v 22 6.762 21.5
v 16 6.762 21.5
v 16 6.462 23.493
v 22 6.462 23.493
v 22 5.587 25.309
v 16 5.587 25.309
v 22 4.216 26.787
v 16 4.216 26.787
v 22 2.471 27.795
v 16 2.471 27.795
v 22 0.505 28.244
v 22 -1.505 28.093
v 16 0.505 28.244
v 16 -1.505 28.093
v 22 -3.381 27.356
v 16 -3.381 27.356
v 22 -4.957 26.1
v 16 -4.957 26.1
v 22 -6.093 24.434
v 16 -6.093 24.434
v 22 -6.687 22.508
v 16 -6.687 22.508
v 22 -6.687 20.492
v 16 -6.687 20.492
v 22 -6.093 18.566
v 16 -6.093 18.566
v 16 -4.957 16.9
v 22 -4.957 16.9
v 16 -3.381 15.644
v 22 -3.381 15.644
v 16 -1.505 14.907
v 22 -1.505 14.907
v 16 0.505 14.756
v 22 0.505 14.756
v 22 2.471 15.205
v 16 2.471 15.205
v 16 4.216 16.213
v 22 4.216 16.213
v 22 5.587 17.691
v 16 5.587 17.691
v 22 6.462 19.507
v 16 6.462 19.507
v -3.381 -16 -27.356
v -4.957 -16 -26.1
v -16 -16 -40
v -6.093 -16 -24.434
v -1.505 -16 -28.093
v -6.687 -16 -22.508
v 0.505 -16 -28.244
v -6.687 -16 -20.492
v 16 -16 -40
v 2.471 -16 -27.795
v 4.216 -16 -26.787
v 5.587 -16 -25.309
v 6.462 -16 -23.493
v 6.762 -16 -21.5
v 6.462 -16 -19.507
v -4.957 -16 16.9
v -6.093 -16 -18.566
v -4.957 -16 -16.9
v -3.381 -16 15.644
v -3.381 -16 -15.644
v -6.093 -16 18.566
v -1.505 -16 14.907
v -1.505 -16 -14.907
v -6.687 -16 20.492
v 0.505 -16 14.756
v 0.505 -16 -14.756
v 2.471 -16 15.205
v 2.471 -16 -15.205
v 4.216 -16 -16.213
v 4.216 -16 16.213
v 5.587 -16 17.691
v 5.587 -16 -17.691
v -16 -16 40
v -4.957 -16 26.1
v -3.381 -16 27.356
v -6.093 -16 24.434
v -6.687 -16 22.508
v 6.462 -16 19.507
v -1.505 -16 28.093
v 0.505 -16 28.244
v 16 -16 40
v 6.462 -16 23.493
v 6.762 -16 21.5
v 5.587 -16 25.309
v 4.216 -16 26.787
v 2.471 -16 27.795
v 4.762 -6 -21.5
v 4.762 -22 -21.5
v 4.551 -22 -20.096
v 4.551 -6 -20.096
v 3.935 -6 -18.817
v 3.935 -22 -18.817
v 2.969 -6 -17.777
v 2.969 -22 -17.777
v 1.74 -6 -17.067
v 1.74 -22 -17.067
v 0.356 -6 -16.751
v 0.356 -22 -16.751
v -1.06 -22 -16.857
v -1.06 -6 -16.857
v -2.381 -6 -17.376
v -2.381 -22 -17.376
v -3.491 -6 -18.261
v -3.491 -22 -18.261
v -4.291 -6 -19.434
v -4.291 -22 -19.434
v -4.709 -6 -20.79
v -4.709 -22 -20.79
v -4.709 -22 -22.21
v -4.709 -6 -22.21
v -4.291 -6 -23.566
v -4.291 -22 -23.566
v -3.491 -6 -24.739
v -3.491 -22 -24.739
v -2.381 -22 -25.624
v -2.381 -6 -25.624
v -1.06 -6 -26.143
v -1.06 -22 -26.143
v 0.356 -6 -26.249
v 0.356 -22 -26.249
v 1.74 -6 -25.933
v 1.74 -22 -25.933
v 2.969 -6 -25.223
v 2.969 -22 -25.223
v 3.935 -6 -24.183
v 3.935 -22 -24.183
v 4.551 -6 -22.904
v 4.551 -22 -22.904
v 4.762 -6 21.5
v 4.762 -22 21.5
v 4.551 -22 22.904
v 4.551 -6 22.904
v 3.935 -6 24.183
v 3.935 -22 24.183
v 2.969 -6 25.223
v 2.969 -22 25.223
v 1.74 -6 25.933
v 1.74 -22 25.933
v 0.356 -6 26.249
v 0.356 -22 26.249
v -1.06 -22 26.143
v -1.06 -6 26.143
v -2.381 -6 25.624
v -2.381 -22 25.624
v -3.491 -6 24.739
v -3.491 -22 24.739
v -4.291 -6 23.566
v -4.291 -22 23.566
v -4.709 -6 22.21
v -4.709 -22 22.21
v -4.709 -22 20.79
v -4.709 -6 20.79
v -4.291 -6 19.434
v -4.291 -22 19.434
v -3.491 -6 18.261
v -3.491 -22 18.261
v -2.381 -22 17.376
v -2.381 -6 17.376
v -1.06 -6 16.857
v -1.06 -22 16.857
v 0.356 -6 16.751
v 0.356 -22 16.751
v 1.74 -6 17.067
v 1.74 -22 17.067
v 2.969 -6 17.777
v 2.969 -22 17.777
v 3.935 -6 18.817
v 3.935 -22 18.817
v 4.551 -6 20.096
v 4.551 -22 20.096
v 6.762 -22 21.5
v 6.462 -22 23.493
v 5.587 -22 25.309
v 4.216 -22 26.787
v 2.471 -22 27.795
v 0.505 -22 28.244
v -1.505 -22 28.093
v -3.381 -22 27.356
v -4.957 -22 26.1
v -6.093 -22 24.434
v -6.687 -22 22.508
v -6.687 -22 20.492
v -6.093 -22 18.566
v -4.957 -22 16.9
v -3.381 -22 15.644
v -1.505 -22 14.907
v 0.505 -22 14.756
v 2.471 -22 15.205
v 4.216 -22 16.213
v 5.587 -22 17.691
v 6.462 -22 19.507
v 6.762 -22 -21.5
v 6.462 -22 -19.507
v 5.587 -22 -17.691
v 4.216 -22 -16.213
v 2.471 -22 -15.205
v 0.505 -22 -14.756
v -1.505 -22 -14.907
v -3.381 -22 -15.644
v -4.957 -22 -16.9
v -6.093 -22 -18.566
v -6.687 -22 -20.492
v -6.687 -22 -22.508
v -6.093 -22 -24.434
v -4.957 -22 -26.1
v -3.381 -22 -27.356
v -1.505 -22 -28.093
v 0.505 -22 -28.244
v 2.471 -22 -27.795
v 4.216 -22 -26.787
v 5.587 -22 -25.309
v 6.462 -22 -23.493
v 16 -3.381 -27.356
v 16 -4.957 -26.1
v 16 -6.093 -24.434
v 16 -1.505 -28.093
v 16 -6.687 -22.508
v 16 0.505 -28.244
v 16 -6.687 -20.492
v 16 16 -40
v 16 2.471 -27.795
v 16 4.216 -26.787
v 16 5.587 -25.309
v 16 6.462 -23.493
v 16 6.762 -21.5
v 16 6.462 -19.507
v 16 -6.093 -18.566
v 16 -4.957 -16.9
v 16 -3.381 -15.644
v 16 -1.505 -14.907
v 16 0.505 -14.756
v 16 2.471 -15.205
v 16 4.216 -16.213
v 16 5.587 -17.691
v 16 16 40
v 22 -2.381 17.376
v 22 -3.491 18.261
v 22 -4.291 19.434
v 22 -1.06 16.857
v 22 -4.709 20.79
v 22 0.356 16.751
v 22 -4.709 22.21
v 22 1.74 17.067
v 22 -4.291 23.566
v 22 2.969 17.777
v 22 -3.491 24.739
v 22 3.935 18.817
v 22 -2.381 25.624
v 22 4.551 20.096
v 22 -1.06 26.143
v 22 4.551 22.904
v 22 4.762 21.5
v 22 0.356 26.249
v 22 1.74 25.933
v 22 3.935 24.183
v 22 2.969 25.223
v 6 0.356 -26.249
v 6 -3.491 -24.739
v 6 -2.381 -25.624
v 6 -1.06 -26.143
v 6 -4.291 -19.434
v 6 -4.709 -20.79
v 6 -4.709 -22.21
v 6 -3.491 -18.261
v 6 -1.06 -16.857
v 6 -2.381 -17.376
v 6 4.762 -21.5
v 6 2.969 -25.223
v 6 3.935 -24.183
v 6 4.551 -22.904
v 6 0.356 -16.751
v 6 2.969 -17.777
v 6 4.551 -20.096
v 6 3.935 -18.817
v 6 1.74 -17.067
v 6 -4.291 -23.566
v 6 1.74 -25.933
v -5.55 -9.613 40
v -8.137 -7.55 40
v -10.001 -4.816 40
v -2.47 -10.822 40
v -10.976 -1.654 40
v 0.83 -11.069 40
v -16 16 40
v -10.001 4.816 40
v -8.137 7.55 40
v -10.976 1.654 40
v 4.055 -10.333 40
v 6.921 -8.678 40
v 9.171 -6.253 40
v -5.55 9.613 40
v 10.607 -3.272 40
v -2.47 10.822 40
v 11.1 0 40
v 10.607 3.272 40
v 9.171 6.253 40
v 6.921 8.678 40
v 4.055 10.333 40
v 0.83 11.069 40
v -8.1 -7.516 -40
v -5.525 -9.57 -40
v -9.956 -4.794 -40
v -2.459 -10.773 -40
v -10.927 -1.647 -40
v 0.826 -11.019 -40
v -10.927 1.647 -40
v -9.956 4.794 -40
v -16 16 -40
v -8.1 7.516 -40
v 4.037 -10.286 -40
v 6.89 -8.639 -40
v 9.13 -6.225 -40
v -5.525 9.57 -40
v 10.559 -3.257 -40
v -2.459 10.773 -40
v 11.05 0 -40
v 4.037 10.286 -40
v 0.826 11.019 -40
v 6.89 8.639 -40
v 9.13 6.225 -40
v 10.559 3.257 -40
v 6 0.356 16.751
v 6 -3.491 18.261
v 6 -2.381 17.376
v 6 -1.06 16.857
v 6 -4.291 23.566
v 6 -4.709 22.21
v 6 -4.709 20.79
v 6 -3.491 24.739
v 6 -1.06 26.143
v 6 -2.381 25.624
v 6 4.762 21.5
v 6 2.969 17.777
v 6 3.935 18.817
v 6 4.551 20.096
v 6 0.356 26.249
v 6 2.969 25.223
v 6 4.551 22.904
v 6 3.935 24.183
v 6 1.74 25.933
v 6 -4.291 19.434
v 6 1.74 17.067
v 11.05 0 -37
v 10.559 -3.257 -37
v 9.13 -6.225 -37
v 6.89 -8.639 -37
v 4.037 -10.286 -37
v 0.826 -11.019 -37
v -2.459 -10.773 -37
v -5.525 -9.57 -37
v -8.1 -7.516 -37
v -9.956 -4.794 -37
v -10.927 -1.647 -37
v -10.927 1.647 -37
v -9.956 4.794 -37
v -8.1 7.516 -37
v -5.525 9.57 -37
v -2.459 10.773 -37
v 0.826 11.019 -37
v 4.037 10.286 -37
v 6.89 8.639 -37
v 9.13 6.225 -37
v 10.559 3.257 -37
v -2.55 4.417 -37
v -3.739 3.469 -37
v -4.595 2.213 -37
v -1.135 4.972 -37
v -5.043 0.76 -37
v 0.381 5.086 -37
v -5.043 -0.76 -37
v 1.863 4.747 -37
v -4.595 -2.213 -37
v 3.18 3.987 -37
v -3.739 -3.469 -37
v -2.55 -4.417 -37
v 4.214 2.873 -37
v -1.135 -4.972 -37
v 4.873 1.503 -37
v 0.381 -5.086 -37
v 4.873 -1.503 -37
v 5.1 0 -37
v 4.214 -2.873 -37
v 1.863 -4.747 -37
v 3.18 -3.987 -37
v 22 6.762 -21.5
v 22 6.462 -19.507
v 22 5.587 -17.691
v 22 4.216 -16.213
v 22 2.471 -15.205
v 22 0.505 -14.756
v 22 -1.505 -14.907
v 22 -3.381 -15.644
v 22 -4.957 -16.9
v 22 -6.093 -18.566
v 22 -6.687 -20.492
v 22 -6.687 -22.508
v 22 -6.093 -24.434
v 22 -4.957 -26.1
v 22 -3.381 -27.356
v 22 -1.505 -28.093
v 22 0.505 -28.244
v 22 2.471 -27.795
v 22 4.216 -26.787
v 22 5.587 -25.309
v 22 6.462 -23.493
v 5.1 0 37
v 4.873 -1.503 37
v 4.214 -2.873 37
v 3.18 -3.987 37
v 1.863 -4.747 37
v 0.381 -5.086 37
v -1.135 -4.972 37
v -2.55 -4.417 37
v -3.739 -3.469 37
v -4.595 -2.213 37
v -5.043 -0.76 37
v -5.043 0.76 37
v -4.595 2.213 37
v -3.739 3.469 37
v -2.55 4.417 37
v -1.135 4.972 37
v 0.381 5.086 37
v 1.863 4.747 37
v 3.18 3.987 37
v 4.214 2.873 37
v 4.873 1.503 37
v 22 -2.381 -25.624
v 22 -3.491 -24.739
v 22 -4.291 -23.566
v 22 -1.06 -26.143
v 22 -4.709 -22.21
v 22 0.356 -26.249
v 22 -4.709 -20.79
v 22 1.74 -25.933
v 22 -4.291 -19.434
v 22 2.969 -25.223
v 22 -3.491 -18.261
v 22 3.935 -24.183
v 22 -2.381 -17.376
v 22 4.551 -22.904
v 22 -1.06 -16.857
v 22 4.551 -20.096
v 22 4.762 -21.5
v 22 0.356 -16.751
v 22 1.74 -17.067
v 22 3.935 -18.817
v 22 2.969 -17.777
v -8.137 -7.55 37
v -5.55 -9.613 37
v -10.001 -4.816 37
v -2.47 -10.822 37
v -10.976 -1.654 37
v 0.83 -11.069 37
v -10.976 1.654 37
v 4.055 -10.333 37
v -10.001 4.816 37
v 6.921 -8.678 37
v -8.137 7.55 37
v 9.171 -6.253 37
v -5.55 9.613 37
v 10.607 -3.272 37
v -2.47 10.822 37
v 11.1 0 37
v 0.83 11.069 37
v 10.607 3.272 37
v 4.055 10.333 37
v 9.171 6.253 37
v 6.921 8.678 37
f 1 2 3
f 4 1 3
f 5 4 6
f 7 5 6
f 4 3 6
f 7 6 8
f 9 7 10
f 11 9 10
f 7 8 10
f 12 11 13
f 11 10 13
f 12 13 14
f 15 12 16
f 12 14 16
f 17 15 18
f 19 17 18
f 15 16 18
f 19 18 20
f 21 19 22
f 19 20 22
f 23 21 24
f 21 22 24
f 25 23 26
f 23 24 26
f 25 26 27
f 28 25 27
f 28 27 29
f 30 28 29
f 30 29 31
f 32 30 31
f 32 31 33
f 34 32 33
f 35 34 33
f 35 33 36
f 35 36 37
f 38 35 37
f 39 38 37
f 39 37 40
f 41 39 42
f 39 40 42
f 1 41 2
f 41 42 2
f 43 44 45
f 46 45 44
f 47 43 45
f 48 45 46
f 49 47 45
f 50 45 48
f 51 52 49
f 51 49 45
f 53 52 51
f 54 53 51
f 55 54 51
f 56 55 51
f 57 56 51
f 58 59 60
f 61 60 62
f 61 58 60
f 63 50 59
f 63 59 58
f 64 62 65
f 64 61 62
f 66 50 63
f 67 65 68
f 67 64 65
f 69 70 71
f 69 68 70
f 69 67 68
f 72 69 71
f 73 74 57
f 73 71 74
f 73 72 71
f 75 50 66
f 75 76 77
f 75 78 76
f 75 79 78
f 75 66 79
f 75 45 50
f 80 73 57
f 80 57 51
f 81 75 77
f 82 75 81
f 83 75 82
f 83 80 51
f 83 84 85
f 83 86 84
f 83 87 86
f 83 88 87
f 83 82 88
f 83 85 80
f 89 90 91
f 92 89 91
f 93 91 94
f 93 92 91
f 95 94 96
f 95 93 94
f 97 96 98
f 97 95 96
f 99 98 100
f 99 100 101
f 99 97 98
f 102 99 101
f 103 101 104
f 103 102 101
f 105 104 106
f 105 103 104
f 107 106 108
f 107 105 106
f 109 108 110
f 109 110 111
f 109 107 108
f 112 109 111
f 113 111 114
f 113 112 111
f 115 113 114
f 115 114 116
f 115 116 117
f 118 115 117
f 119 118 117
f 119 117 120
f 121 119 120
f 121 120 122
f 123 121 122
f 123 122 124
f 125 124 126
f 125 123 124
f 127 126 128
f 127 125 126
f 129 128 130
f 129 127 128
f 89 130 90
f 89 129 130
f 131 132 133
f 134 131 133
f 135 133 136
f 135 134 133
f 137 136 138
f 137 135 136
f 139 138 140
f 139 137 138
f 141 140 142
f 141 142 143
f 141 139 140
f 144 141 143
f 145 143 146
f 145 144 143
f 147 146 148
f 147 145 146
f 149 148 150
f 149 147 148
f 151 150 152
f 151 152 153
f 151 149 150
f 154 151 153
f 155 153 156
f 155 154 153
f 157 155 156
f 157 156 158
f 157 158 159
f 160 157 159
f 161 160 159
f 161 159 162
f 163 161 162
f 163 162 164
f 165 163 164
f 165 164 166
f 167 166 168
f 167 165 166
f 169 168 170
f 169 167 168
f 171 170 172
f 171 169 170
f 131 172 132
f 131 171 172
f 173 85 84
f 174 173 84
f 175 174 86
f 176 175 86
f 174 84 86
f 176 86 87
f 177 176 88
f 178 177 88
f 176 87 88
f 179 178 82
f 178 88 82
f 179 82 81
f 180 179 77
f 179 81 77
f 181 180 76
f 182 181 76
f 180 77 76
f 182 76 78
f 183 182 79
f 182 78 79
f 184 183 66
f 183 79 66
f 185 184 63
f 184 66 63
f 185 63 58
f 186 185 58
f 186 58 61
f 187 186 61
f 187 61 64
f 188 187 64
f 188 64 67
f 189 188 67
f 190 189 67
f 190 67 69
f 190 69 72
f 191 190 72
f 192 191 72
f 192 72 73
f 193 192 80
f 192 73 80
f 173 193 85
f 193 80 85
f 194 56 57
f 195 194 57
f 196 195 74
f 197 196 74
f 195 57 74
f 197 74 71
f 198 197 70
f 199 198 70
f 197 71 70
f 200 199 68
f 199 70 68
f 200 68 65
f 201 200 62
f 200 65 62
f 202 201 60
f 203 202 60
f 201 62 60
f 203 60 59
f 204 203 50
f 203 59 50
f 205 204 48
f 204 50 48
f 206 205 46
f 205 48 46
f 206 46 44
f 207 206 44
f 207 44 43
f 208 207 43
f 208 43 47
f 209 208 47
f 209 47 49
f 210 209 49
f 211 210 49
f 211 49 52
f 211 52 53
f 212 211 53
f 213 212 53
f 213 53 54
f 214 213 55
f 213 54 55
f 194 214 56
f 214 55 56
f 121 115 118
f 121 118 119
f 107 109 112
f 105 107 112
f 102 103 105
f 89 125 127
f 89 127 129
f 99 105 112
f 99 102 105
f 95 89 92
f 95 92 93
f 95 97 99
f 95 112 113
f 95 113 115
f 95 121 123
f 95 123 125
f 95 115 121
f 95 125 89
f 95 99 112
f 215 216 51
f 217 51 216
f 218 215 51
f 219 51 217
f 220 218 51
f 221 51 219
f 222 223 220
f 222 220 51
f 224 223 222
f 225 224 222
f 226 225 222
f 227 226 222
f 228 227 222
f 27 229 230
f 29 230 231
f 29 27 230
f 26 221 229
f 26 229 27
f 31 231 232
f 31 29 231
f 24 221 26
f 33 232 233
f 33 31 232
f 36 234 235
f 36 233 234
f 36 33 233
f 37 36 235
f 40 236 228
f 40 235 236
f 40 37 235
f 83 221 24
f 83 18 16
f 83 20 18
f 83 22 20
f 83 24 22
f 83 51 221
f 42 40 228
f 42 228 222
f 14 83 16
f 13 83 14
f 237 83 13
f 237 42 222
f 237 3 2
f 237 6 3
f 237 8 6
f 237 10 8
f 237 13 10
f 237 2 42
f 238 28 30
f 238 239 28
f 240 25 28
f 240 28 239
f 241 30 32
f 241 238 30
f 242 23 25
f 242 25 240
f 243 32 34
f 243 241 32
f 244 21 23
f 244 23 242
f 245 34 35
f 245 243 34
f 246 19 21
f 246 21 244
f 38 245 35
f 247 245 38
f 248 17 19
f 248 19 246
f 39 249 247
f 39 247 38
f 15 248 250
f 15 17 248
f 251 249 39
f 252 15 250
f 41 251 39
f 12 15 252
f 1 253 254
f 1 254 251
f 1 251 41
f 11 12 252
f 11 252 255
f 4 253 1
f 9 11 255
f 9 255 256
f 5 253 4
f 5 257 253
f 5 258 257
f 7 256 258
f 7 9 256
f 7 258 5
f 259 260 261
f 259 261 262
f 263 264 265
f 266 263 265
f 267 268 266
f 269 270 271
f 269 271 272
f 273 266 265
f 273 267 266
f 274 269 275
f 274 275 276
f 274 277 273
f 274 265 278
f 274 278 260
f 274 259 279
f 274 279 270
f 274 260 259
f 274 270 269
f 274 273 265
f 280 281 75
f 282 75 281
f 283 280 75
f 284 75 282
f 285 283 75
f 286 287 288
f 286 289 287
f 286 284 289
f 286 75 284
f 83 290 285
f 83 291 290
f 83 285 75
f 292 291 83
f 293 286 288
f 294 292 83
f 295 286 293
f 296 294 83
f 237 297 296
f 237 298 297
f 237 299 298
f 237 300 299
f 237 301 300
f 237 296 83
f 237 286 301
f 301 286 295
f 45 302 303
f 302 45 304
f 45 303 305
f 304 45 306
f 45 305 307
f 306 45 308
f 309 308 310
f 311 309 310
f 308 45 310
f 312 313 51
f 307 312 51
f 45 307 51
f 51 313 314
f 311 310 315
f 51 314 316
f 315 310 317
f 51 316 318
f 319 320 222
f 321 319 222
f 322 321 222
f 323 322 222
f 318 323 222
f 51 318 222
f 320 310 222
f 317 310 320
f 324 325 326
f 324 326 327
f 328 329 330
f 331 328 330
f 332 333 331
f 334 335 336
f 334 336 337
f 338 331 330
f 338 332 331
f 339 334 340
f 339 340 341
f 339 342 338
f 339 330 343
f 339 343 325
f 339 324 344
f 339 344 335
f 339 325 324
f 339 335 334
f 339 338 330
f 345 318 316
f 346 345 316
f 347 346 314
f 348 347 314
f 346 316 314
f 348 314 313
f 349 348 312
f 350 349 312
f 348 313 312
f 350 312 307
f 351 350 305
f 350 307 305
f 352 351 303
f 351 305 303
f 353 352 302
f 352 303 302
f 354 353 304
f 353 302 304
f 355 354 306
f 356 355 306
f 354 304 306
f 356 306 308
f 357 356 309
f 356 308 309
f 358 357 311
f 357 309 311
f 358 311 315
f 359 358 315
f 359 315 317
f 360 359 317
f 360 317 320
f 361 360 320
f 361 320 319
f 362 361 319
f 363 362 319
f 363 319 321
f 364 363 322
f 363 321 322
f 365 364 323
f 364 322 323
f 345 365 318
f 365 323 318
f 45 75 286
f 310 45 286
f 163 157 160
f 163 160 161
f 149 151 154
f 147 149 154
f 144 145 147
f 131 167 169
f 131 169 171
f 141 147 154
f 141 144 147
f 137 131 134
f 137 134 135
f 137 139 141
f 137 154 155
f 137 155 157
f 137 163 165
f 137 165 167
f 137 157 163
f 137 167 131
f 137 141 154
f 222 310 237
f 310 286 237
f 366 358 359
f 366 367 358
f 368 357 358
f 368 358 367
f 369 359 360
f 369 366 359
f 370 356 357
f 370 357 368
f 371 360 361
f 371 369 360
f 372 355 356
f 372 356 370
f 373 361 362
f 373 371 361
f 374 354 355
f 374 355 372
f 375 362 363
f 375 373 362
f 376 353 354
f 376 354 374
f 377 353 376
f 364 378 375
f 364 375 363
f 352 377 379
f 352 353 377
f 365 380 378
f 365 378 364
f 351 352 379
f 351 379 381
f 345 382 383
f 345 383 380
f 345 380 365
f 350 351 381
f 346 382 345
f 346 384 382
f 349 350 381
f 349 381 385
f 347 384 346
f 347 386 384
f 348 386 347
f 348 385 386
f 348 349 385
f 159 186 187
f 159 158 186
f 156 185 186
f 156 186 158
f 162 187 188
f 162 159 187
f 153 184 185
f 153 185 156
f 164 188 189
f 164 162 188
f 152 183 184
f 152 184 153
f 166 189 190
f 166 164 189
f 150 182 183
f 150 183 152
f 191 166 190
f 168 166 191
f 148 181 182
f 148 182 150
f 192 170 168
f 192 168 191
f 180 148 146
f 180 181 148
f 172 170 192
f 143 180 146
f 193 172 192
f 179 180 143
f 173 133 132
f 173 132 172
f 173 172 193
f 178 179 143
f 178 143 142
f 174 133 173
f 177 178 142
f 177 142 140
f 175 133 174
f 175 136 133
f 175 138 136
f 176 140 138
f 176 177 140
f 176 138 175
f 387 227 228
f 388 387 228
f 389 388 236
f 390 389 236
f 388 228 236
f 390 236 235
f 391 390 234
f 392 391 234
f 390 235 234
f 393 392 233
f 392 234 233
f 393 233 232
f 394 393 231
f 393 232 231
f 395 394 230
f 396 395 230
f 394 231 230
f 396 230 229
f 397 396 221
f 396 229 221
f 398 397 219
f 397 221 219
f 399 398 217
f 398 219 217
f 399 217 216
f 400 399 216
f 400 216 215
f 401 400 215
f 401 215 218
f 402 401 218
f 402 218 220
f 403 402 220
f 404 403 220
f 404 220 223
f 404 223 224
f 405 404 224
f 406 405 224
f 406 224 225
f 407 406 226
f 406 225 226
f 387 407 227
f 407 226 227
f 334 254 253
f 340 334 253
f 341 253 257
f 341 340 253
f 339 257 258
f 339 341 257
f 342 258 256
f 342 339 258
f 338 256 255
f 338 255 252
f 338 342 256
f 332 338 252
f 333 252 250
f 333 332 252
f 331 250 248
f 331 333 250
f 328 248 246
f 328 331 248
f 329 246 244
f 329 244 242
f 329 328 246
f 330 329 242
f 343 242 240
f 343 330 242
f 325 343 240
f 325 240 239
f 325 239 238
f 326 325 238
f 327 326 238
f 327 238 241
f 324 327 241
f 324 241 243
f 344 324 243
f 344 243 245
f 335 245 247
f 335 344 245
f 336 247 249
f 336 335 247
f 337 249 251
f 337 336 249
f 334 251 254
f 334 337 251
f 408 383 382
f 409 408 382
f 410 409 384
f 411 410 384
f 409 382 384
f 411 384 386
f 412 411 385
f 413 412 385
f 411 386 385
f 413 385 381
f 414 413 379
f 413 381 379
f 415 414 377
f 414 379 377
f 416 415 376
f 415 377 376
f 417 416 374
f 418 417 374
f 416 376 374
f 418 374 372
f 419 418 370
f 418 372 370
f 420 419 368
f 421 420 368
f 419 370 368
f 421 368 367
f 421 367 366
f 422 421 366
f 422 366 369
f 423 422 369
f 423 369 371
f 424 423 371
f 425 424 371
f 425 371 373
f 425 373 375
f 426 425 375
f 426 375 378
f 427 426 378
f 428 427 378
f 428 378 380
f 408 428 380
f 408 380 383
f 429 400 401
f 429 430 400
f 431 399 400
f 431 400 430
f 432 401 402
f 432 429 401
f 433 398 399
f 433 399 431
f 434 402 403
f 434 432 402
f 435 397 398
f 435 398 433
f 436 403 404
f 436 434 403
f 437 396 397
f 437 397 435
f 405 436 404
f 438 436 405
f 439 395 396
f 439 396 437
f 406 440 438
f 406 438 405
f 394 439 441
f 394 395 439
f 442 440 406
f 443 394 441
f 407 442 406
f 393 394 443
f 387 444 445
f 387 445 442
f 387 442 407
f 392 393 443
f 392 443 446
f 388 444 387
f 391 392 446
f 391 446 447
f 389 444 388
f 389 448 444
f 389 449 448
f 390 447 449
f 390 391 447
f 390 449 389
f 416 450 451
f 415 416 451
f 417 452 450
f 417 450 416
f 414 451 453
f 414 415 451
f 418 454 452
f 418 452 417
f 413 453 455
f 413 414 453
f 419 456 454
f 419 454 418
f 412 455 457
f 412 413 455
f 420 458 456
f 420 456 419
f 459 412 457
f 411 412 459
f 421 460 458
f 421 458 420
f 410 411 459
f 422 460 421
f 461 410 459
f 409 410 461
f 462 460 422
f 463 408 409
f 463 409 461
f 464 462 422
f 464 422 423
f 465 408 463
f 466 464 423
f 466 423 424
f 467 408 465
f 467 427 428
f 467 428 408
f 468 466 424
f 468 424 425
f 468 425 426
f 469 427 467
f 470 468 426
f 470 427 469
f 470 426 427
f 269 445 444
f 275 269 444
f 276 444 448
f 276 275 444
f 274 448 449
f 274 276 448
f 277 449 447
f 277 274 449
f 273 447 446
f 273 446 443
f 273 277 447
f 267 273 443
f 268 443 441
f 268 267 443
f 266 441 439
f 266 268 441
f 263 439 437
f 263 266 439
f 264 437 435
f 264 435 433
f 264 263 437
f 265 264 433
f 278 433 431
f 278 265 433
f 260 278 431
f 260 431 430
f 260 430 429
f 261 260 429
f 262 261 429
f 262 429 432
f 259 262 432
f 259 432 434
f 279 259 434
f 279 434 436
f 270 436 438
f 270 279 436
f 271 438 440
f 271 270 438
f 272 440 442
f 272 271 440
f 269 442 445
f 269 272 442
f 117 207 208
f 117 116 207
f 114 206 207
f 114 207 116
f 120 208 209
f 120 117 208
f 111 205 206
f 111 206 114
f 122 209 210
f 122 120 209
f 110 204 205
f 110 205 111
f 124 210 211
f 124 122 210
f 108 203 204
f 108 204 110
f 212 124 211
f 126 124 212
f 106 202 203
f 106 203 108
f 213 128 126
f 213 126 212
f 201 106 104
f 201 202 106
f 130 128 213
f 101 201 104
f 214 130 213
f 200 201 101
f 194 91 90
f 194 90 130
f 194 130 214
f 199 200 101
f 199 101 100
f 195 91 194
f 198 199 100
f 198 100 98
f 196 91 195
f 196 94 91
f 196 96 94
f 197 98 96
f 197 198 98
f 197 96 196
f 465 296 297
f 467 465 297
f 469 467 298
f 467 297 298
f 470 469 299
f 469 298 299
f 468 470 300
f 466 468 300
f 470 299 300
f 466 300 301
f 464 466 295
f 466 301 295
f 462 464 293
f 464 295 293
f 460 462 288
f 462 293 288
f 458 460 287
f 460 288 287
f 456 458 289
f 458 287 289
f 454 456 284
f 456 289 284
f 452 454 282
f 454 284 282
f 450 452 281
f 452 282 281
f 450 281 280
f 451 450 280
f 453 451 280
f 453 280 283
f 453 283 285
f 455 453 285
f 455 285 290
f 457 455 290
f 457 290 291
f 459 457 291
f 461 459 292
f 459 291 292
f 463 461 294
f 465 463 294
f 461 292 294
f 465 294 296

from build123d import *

# Parameters (mm, degrees)
F0_W      = 32
F0_H      = 32
F1_DEPTH  = 40
F2_R      = 4.7625
F3_DEPTH  = 10
F4_R      = 4.7625
F5_DEPTH  = 10
F6_R      = 11.1
F7_DEPTH  = 3
F8_R      = 11.05
F9_DEPTH  = 3
F10_R     = 5.1
F11_DEPTH = 80.001
F12_R     = 6.7625
F12_R_2   = 4.7625
F13_DEPTH = 6
F14_R     = 6.7625
F14_R_2   = 4.7625
F15_DEPTH = 6


with BuildPart() as f1:
    # F0 (on Top) → F1 (new body, symmetric)
    with BuildSketch(Plane.XY):
        Rectangle(F0_W, F0_H)
    extrude(amount=F1_DEPTH, both=True)

    # F2 (on face) → F3 (cut)
    with BuildSketch(Plane.YZ.offset(16)):
        with Locations((0, 21.5)):
            Circle(F2_R)
        with Locations((0, -21.5)):
            Circle(F2_R)
    extrude(amount=-F3_DEPTH, mode=Mode.SUBTRACT)

    # F4 (on face) → F5 (cut)
    with BuildSketch(Plane.XZ.offset(16)):
        with Locations((0, 21.5)):
            Circle(F4_R)
        with Locations((0, -21.5)):
            Circle(F4_R)
    extrude(amount=-F5_DEPTH, mode=Mode.SUBTRACT)

    # F6 (on face) → F7 (cut)
    with BuildSketch(Plane.XY.offset(40)):
        Circle(F6_R)
    extrude(amount=-F7_DEPTH, mode=Mode.SUBTRACT)

    # F8 (on face) → F9 (cut)
    with BuildSketch(Plane(origin=(0, 0, -40), x_dir=(1, 0, 0), z_dir=(0, 0, -1))):
        Circle(F8_R)
    extrude(amount=-F9_DEPTH, mode=Mode.SUBTRACT)

    # F10 (on face) → F11 (cut, through all)
    with BuildSketch(Plane(origin=(0, 0, -40), x_dir=(1, 0, 0), z_dir=(0, 0, -1))):
        Circle(F10_R)
    extrude(amount=-F11_DEPTH, mode=Mode.SUBTRACT)

    # F12 (on face) → F13 (join)
    with BuildSketch(Plane.YZ.offset(16)):
        with Locations((0, 21.5)):
            Circle(F12_R)
        with Locations((0, 21.5)):
            Circle(F12_R_2, mode=Mode.SUBTRACT)
        with Locations((0, -21.5)):
            Circle(F12_R)
        with Locations((0, -21.5)):
            Circle(F12_R_2, mode=Mode.SUBTRACT)
    extrude(amount=F13_DEPTH)

    # F14 (on face) → F15 (join)
    with BuildSketch(Plane.XZ.offset(16)):
        with Locations((0, 21.5)):
            Circle(F14_R)
        with Locations((0, 21.5)):
            Circle(F14_R_2, mode=Mode.SUBTRACT)
        with Locations((0, -21.5)):
            Circle(F14_R)
        with Locations((0, -21.5)):
            Circle(F14_R_2, mode=Mode.SUBTRACT)
    extrude(amount=F15_DEPTH)


solid = f1.part
